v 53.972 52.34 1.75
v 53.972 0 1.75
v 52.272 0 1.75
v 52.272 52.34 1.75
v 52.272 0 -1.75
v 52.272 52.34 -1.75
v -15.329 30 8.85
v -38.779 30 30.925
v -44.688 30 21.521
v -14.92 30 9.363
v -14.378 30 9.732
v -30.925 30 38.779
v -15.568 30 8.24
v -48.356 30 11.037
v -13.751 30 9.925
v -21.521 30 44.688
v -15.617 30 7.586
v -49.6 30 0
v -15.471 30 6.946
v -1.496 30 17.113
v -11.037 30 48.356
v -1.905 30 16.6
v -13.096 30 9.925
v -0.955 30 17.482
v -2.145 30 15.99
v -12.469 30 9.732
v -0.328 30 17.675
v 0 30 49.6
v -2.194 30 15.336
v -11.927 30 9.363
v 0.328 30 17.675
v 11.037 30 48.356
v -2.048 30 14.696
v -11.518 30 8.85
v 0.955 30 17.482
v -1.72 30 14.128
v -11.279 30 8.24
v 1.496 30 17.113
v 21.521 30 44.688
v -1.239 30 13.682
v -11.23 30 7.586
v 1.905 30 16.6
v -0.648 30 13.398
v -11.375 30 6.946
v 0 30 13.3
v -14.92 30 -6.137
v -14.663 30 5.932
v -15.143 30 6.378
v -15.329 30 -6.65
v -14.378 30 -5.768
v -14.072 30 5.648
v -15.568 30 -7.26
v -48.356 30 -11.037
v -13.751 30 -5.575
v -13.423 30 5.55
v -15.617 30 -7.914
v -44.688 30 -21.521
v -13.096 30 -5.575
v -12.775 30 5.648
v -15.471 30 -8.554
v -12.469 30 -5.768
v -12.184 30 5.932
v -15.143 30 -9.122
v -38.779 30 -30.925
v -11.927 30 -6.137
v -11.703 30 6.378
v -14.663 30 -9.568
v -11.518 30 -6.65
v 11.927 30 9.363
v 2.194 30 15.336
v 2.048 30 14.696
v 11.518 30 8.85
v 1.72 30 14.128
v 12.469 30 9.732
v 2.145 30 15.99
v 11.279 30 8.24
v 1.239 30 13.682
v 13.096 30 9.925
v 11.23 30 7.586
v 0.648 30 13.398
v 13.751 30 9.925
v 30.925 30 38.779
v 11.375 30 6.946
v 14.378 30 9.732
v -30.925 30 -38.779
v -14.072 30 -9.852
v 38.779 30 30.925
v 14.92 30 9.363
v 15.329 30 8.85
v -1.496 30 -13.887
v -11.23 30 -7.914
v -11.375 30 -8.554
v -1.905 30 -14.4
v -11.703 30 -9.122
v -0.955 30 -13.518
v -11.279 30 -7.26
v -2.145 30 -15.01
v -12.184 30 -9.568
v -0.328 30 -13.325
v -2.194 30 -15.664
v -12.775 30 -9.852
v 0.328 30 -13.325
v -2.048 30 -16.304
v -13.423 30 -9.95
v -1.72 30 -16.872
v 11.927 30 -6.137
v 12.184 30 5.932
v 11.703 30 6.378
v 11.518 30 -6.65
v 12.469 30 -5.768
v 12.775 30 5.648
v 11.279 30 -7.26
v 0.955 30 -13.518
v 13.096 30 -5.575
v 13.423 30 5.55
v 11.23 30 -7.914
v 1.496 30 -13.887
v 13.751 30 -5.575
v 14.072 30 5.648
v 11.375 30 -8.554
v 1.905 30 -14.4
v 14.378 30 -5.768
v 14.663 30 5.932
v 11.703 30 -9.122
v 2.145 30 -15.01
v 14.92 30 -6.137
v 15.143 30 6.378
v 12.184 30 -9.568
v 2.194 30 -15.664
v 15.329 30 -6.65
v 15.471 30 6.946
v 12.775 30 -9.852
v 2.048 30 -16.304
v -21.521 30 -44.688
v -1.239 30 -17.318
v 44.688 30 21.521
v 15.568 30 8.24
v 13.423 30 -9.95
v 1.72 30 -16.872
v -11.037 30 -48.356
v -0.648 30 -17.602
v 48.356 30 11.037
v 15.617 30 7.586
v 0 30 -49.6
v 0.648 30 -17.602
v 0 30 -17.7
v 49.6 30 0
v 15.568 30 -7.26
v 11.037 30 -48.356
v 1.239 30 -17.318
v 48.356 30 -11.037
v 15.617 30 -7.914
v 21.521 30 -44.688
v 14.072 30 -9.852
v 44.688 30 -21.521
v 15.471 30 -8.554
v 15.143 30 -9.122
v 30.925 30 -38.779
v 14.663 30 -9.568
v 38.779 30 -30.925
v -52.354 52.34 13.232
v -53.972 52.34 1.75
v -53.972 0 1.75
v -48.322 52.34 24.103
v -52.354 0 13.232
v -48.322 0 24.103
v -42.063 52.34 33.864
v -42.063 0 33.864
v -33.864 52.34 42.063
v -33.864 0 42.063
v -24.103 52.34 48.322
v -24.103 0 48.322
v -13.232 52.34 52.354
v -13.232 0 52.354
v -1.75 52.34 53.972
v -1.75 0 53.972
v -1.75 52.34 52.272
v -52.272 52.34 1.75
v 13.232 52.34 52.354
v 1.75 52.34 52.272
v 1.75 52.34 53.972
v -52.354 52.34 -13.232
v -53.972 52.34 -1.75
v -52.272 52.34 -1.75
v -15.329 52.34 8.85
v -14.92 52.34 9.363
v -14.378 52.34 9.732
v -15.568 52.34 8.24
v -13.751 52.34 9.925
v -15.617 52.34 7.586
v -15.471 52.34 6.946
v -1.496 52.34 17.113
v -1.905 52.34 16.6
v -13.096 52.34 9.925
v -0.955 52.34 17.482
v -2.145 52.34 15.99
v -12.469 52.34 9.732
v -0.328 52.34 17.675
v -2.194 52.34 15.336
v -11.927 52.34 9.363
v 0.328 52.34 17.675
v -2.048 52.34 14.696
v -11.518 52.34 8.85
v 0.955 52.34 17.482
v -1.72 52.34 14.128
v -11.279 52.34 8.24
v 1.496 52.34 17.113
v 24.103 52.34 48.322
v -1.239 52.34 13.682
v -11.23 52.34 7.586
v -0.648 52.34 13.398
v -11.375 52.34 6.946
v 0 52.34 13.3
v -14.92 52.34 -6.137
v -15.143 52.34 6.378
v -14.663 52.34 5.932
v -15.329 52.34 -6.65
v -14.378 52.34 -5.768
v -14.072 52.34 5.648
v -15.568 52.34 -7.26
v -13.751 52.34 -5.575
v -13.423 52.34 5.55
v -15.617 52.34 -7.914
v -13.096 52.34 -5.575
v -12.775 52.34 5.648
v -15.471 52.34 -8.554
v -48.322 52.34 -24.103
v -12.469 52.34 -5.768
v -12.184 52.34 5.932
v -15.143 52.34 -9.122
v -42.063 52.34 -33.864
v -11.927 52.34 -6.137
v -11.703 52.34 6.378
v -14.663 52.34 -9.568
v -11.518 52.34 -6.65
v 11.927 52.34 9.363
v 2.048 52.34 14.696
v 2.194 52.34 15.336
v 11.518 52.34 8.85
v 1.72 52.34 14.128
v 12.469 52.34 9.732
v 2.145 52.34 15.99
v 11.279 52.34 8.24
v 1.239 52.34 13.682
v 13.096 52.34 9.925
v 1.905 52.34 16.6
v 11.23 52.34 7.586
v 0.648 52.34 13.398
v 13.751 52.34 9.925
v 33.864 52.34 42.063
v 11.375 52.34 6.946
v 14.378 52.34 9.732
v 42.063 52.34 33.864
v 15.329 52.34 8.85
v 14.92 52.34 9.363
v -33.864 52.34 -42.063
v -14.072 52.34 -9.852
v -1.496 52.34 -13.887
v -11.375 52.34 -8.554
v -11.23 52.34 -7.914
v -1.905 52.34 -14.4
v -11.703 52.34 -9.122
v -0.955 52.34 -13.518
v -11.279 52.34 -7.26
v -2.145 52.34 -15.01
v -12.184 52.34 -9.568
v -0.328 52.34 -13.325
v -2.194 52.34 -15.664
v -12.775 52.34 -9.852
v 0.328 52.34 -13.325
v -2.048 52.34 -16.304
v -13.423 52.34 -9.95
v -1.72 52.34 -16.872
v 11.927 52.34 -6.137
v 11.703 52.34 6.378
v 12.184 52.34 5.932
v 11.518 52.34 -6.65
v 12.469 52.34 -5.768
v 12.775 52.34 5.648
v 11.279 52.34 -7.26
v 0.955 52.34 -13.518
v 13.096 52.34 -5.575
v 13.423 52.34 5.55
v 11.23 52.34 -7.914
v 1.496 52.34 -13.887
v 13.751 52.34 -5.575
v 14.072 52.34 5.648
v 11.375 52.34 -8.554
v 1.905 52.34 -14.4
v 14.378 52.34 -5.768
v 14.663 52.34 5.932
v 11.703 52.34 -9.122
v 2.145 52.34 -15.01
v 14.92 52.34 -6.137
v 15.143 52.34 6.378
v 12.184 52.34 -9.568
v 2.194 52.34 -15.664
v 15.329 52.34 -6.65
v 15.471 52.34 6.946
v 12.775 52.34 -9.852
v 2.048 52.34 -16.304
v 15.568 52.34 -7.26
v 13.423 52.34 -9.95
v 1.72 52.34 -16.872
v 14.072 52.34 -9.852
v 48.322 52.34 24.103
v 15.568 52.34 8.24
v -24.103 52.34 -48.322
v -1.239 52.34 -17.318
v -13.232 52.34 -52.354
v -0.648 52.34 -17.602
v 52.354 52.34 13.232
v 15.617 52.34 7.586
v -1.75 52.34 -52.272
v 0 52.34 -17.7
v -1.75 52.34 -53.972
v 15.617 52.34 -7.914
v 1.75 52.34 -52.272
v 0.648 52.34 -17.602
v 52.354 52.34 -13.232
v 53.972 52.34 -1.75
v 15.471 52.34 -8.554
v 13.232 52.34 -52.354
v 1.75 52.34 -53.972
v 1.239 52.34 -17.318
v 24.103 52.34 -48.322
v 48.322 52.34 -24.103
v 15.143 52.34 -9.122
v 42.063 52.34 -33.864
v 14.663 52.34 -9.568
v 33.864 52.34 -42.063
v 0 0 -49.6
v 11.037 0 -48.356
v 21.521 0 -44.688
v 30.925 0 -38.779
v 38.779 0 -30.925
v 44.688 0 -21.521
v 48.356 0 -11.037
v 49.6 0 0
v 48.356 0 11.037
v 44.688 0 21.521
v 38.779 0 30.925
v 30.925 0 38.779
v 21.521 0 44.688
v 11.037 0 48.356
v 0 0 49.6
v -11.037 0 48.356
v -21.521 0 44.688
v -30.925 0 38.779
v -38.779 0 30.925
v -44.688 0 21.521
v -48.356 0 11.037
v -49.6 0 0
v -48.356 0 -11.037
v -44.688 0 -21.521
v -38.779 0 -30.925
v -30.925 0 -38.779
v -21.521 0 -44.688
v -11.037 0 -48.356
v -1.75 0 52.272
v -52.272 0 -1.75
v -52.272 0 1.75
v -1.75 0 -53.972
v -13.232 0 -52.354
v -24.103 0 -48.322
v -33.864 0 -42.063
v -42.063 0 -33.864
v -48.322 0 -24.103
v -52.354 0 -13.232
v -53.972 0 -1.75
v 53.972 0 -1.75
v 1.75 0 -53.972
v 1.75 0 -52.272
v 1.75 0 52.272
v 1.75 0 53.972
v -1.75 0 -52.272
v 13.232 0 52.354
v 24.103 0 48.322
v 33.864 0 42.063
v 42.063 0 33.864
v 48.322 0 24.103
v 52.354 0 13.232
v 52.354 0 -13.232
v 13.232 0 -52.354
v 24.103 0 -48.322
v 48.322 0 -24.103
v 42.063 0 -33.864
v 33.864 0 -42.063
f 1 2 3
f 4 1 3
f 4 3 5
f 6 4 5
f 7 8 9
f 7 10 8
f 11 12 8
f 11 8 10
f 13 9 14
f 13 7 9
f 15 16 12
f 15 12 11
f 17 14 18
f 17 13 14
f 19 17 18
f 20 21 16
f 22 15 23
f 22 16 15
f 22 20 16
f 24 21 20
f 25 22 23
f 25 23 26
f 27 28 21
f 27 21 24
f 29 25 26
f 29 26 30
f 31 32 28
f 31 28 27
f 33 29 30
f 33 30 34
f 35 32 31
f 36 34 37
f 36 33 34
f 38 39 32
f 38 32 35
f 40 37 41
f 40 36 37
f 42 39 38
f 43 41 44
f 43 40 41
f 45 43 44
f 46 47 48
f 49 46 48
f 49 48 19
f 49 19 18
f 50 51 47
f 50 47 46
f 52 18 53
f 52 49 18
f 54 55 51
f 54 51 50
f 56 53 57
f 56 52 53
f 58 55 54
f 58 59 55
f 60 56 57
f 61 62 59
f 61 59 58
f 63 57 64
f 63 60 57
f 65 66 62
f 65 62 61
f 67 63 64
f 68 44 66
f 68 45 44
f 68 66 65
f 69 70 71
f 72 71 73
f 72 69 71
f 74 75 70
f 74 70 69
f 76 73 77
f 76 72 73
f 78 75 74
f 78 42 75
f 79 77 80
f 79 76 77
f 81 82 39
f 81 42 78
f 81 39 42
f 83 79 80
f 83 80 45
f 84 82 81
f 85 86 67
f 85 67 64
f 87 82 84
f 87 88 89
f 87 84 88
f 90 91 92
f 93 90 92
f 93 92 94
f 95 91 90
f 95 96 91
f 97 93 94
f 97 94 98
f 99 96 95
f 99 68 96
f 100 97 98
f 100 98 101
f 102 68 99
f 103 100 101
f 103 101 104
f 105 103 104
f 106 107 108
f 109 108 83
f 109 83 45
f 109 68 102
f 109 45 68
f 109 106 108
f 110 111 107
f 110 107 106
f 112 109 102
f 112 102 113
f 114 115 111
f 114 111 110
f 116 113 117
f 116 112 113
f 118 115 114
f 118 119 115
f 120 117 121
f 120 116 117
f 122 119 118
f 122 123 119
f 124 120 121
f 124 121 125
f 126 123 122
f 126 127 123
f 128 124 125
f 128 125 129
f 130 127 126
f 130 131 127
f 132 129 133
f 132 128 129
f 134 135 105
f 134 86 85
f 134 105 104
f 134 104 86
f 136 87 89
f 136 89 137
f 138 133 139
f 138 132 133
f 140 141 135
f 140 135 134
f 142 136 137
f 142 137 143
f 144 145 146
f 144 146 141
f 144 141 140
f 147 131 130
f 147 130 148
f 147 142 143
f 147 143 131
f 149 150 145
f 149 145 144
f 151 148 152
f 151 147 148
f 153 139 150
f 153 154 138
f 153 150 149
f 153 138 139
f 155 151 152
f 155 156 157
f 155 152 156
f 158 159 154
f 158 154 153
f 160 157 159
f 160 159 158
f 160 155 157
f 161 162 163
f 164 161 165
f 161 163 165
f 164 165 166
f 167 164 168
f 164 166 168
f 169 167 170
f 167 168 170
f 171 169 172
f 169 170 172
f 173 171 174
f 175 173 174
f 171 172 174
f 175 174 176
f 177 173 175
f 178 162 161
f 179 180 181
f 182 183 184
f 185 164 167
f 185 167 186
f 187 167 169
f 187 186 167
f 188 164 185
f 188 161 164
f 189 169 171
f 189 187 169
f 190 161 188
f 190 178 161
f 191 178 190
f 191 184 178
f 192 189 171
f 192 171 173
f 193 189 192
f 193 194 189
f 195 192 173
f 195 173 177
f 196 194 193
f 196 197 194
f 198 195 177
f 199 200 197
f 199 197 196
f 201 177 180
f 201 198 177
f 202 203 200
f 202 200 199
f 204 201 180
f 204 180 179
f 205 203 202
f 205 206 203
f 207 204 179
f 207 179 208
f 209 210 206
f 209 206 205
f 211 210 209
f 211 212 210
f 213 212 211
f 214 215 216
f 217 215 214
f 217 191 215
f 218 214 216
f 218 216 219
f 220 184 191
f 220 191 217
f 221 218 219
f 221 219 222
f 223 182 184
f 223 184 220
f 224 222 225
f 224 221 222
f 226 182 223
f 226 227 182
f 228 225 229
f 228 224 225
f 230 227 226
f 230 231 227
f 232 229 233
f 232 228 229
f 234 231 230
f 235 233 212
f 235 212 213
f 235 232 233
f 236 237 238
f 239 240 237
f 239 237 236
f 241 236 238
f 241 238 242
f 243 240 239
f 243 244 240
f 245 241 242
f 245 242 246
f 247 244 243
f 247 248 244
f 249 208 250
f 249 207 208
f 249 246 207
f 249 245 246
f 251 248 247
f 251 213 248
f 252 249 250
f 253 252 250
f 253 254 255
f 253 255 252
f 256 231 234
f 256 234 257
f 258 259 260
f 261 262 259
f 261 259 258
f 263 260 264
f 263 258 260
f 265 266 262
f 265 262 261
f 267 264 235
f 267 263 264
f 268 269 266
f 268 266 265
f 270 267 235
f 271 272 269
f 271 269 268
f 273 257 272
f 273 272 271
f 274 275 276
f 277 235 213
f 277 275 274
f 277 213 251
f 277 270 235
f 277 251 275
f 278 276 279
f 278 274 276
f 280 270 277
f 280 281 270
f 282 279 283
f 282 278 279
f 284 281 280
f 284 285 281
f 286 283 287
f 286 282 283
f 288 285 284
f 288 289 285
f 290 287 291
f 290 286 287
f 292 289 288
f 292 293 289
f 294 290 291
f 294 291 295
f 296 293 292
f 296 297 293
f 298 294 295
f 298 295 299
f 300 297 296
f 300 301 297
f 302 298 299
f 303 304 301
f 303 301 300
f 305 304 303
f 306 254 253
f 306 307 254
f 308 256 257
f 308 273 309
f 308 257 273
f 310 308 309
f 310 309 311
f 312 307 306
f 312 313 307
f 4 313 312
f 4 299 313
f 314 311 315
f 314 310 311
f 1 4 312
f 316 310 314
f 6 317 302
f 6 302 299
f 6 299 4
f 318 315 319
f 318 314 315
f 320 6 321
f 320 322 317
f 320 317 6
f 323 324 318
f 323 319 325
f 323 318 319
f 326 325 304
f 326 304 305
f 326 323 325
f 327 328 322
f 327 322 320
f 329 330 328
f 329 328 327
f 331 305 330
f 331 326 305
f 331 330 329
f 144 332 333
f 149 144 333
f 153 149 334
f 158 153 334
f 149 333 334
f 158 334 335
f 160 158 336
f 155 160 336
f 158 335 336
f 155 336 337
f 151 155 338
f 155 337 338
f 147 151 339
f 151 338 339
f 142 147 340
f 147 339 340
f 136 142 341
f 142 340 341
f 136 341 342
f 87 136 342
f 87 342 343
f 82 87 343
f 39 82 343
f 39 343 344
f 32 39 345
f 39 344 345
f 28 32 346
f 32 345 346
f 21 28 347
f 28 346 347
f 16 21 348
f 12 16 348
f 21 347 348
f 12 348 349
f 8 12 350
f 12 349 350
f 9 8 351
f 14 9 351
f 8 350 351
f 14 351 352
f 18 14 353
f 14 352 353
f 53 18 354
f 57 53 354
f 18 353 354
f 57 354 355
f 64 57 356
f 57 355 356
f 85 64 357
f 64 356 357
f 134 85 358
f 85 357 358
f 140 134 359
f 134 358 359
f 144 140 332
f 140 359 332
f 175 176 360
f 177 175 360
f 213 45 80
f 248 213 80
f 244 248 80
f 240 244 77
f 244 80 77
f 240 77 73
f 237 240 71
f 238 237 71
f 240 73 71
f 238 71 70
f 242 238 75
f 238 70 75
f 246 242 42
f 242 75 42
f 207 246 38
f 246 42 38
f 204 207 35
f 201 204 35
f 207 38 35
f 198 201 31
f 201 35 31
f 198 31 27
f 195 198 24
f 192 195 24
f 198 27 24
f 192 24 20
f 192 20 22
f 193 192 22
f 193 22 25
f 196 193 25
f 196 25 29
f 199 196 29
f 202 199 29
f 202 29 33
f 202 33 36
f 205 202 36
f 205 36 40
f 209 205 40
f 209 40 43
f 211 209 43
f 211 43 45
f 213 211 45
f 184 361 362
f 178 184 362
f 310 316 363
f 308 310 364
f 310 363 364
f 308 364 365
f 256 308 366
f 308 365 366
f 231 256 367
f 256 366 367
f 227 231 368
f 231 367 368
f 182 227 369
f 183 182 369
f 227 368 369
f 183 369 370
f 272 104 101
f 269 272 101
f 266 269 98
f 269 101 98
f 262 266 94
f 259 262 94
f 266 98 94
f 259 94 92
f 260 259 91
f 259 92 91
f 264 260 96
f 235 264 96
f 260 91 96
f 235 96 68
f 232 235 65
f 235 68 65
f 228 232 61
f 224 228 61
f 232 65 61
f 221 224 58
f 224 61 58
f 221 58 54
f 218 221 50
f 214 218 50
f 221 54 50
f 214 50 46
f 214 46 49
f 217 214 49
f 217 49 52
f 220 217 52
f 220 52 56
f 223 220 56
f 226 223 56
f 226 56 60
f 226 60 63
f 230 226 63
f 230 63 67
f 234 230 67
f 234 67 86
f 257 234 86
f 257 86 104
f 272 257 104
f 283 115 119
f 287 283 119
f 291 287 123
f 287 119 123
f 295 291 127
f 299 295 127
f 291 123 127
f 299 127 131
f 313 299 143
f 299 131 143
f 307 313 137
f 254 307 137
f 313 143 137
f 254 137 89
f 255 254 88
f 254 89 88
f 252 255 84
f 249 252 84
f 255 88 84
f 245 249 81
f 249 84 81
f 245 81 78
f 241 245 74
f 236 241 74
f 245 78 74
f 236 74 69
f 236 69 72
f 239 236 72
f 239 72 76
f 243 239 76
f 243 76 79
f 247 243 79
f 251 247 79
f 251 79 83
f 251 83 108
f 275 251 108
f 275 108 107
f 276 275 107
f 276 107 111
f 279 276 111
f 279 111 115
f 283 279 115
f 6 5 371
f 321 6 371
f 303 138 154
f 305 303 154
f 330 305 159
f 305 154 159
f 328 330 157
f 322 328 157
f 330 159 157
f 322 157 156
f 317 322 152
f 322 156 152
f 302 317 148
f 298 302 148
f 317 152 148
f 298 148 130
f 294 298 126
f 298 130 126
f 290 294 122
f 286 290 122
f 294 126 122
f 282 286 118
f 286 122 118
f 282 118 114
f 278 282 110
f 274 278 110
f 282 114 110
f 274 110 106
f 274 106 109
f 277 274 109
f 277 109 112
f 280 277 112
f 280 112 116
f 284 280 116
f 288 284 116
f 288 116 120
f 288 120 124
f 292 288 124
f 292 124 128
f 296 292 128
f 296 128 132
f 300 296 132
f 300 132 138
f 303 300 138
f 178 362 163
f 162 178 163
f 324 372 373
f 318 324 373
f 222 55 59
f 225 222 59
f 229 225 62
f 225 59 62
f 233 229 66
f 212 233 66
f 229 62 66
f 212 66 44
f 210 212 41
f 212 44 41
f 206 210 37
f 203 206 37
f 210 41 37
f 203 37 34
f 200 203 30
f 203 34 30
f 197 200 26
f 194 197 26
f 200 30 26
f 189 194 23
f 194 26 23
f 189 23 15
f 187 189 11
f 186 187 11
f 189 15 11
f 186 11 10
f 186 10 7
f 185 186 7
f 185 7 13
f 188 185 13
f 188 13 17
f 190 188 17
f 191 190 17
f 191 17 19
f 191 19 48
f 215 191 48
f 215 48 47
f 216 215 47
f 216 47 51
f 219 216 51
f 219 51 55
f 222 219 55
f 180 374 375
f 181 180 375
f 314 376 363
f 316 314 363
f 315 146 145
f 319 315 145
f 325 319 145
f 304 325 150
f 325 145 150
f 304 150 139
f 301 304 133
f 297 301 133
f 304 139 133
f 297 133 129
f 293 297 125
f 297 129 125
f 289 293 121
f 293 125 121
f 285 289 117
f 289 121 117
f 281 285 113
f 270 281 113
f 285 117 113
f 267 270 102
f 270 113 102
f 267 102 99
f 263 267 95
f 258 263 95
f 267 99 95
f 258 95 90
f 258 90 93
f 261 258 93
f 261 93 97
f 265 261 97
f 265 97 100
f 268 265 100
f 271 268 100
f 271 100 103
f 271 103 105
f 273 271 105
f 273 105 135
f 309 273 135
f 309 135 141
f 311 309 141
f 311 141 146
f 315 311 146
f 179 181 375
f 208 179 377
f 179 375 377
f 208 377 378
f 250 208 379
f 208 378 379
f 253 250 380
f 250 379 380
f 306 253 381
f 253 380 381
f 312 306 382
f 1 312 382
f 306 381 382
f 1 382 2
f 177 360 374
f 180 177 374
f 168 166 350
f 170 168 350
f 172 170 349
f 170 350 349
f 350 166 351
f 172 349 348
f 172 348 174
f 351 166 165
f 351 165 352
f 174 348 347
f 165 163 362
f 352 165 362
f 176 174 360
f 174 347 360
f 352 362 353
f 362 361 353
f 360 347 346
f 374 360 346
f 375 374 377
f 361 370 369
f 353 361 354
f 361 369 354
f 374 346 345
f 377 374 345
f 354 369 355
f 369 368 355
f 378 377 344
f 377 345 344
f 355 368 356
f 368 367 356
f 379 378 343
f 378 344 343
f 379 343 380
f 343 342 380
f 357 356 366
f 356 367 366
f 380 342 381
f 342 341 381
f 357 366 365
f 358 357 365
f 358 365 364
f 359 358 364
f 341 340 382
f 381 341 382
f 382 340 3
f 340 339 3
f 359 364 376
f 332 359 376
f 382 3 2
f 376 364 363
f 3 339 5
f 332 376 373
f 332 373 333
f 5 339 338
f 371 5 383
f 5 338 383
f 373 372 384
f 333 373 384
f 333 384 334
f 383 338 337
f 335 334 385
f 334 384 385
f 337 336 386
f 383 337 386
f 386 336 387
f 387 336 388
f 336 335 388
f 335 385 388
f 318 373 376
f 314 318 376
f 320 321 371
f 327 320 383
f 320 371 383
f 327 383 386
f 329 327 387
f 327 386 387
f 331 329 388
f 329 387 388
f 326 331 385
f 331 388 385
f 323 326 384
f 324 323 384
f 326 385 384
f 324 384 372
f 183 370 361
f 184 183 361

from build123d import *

# Parameters (mm, degrees)
BOSS_EXTRUDE1_DEPTH = 52.34
SKETCH2_R           = 2.2
CUT_EXTRUDE1_DEPTH  = 80
SKETCH3_R           = 49.6
CUT_EXTRUDE2_DEPTH  = 30


with BuildPart() as part:
    # Sketch1 → Boss-Extrude1 (new body)
    with BuildSketch(Plane(origin=(0, 0, 0), x_dir=(1, 0, 0), z_dir=(0, 1, 0))):
        with BuildLine():
            ThreePointArc((-53.971636069, -1.75), (-38.183766184, -38.183766184), (-1.75, -53.971636069))
            Line((-1.75, -53.971636069), (-1.75, -52.271636069))
            Line((-1.75, -52.271636069), (1.75, -52.271636069))
            Line((1.75, -52.271636069), (1.75, -53.971636069))
            ThreePointArc((1.75, -53.971636069), (38.183766184, -38.183766184), (53.971636069, -1.75))
            Line((53.971636069, -1.75), (52.271636069, -1.75))
            Line((52.271636069, -1.75), (52.271636069, 1.75))
            Line((52.271636069, 1.75), (53.971636069, 1.75))
            ThreePointArc((53.971636069, 1.75), (38.183766184, 38.183766184), (1.75, 53.971636069))
            Line((1.75, 53.971636069), (1.75, 52.271636069))
            Line((1.75, 52.271636069), (-1.75, 52.271636069))
            Line((-1.75, 52.271636069), (-1.75, 53.971636069))
            ThreePointArc((-1.75, 53.971636069), (-38.183766184, 38.183766184), (-53.971636069, 1.75))
            Line((-53.971636069, 1.75), (-52.271636069, 1.75))
            Line((-52.271636069, 1.75), (-52.271636069, -1.75))
            Line((-52.271636069, -1.75), (-53.971636069, -1.75))
        make_face()
    extrude(amount=BOSS_EXTRUDE1_DEPTH)

    # Sketch2 → Cut-Extrude1 (cut)
    with BuildSketch(Plane.XZ):
        with Locations(Location((0, 15.5, 0), (0, 0, 270))):
            Circle(SKETCH2_R)
        with Locations(Location((13.423393759, 7.75, 0), (0, 0, 270))):
            Circle(SKETCH2_R)
        with Locations(Location((13.423393759, -7.75, 0), (0, 0, 270))):
            Circle(SKETCH2_R)
        with Locations(Location((0, -15.5, 0), (0, 0, 270))):
            Circle(SKETCH2_R)
        with Locations(Location((-13.423393759, -7.75, 0), (0, 0, 270))):
            Circle(SKETCH2_R)
        with Locations(Location((-13.423393759, 7.75, 0), (0, 0, 270))):
            Circle(SKETCH2_R)
    extrude(amount=-CUT_EXTRUDE1_DEPTH, mode=Mode.SUBTRACT)

    # Sketch3 → Cut-Extrude2 (cut)
    with BuildSketch(Plane.XZ):
        with Locations(Location((0, 0, 0), (0, 0, 270))):
            Circle(SKETCH3_R)
    extrude(amount=-CUT_EXTRUDE2_DEPTH, mode=Mode.SUBTRACT)


solid = part.part
